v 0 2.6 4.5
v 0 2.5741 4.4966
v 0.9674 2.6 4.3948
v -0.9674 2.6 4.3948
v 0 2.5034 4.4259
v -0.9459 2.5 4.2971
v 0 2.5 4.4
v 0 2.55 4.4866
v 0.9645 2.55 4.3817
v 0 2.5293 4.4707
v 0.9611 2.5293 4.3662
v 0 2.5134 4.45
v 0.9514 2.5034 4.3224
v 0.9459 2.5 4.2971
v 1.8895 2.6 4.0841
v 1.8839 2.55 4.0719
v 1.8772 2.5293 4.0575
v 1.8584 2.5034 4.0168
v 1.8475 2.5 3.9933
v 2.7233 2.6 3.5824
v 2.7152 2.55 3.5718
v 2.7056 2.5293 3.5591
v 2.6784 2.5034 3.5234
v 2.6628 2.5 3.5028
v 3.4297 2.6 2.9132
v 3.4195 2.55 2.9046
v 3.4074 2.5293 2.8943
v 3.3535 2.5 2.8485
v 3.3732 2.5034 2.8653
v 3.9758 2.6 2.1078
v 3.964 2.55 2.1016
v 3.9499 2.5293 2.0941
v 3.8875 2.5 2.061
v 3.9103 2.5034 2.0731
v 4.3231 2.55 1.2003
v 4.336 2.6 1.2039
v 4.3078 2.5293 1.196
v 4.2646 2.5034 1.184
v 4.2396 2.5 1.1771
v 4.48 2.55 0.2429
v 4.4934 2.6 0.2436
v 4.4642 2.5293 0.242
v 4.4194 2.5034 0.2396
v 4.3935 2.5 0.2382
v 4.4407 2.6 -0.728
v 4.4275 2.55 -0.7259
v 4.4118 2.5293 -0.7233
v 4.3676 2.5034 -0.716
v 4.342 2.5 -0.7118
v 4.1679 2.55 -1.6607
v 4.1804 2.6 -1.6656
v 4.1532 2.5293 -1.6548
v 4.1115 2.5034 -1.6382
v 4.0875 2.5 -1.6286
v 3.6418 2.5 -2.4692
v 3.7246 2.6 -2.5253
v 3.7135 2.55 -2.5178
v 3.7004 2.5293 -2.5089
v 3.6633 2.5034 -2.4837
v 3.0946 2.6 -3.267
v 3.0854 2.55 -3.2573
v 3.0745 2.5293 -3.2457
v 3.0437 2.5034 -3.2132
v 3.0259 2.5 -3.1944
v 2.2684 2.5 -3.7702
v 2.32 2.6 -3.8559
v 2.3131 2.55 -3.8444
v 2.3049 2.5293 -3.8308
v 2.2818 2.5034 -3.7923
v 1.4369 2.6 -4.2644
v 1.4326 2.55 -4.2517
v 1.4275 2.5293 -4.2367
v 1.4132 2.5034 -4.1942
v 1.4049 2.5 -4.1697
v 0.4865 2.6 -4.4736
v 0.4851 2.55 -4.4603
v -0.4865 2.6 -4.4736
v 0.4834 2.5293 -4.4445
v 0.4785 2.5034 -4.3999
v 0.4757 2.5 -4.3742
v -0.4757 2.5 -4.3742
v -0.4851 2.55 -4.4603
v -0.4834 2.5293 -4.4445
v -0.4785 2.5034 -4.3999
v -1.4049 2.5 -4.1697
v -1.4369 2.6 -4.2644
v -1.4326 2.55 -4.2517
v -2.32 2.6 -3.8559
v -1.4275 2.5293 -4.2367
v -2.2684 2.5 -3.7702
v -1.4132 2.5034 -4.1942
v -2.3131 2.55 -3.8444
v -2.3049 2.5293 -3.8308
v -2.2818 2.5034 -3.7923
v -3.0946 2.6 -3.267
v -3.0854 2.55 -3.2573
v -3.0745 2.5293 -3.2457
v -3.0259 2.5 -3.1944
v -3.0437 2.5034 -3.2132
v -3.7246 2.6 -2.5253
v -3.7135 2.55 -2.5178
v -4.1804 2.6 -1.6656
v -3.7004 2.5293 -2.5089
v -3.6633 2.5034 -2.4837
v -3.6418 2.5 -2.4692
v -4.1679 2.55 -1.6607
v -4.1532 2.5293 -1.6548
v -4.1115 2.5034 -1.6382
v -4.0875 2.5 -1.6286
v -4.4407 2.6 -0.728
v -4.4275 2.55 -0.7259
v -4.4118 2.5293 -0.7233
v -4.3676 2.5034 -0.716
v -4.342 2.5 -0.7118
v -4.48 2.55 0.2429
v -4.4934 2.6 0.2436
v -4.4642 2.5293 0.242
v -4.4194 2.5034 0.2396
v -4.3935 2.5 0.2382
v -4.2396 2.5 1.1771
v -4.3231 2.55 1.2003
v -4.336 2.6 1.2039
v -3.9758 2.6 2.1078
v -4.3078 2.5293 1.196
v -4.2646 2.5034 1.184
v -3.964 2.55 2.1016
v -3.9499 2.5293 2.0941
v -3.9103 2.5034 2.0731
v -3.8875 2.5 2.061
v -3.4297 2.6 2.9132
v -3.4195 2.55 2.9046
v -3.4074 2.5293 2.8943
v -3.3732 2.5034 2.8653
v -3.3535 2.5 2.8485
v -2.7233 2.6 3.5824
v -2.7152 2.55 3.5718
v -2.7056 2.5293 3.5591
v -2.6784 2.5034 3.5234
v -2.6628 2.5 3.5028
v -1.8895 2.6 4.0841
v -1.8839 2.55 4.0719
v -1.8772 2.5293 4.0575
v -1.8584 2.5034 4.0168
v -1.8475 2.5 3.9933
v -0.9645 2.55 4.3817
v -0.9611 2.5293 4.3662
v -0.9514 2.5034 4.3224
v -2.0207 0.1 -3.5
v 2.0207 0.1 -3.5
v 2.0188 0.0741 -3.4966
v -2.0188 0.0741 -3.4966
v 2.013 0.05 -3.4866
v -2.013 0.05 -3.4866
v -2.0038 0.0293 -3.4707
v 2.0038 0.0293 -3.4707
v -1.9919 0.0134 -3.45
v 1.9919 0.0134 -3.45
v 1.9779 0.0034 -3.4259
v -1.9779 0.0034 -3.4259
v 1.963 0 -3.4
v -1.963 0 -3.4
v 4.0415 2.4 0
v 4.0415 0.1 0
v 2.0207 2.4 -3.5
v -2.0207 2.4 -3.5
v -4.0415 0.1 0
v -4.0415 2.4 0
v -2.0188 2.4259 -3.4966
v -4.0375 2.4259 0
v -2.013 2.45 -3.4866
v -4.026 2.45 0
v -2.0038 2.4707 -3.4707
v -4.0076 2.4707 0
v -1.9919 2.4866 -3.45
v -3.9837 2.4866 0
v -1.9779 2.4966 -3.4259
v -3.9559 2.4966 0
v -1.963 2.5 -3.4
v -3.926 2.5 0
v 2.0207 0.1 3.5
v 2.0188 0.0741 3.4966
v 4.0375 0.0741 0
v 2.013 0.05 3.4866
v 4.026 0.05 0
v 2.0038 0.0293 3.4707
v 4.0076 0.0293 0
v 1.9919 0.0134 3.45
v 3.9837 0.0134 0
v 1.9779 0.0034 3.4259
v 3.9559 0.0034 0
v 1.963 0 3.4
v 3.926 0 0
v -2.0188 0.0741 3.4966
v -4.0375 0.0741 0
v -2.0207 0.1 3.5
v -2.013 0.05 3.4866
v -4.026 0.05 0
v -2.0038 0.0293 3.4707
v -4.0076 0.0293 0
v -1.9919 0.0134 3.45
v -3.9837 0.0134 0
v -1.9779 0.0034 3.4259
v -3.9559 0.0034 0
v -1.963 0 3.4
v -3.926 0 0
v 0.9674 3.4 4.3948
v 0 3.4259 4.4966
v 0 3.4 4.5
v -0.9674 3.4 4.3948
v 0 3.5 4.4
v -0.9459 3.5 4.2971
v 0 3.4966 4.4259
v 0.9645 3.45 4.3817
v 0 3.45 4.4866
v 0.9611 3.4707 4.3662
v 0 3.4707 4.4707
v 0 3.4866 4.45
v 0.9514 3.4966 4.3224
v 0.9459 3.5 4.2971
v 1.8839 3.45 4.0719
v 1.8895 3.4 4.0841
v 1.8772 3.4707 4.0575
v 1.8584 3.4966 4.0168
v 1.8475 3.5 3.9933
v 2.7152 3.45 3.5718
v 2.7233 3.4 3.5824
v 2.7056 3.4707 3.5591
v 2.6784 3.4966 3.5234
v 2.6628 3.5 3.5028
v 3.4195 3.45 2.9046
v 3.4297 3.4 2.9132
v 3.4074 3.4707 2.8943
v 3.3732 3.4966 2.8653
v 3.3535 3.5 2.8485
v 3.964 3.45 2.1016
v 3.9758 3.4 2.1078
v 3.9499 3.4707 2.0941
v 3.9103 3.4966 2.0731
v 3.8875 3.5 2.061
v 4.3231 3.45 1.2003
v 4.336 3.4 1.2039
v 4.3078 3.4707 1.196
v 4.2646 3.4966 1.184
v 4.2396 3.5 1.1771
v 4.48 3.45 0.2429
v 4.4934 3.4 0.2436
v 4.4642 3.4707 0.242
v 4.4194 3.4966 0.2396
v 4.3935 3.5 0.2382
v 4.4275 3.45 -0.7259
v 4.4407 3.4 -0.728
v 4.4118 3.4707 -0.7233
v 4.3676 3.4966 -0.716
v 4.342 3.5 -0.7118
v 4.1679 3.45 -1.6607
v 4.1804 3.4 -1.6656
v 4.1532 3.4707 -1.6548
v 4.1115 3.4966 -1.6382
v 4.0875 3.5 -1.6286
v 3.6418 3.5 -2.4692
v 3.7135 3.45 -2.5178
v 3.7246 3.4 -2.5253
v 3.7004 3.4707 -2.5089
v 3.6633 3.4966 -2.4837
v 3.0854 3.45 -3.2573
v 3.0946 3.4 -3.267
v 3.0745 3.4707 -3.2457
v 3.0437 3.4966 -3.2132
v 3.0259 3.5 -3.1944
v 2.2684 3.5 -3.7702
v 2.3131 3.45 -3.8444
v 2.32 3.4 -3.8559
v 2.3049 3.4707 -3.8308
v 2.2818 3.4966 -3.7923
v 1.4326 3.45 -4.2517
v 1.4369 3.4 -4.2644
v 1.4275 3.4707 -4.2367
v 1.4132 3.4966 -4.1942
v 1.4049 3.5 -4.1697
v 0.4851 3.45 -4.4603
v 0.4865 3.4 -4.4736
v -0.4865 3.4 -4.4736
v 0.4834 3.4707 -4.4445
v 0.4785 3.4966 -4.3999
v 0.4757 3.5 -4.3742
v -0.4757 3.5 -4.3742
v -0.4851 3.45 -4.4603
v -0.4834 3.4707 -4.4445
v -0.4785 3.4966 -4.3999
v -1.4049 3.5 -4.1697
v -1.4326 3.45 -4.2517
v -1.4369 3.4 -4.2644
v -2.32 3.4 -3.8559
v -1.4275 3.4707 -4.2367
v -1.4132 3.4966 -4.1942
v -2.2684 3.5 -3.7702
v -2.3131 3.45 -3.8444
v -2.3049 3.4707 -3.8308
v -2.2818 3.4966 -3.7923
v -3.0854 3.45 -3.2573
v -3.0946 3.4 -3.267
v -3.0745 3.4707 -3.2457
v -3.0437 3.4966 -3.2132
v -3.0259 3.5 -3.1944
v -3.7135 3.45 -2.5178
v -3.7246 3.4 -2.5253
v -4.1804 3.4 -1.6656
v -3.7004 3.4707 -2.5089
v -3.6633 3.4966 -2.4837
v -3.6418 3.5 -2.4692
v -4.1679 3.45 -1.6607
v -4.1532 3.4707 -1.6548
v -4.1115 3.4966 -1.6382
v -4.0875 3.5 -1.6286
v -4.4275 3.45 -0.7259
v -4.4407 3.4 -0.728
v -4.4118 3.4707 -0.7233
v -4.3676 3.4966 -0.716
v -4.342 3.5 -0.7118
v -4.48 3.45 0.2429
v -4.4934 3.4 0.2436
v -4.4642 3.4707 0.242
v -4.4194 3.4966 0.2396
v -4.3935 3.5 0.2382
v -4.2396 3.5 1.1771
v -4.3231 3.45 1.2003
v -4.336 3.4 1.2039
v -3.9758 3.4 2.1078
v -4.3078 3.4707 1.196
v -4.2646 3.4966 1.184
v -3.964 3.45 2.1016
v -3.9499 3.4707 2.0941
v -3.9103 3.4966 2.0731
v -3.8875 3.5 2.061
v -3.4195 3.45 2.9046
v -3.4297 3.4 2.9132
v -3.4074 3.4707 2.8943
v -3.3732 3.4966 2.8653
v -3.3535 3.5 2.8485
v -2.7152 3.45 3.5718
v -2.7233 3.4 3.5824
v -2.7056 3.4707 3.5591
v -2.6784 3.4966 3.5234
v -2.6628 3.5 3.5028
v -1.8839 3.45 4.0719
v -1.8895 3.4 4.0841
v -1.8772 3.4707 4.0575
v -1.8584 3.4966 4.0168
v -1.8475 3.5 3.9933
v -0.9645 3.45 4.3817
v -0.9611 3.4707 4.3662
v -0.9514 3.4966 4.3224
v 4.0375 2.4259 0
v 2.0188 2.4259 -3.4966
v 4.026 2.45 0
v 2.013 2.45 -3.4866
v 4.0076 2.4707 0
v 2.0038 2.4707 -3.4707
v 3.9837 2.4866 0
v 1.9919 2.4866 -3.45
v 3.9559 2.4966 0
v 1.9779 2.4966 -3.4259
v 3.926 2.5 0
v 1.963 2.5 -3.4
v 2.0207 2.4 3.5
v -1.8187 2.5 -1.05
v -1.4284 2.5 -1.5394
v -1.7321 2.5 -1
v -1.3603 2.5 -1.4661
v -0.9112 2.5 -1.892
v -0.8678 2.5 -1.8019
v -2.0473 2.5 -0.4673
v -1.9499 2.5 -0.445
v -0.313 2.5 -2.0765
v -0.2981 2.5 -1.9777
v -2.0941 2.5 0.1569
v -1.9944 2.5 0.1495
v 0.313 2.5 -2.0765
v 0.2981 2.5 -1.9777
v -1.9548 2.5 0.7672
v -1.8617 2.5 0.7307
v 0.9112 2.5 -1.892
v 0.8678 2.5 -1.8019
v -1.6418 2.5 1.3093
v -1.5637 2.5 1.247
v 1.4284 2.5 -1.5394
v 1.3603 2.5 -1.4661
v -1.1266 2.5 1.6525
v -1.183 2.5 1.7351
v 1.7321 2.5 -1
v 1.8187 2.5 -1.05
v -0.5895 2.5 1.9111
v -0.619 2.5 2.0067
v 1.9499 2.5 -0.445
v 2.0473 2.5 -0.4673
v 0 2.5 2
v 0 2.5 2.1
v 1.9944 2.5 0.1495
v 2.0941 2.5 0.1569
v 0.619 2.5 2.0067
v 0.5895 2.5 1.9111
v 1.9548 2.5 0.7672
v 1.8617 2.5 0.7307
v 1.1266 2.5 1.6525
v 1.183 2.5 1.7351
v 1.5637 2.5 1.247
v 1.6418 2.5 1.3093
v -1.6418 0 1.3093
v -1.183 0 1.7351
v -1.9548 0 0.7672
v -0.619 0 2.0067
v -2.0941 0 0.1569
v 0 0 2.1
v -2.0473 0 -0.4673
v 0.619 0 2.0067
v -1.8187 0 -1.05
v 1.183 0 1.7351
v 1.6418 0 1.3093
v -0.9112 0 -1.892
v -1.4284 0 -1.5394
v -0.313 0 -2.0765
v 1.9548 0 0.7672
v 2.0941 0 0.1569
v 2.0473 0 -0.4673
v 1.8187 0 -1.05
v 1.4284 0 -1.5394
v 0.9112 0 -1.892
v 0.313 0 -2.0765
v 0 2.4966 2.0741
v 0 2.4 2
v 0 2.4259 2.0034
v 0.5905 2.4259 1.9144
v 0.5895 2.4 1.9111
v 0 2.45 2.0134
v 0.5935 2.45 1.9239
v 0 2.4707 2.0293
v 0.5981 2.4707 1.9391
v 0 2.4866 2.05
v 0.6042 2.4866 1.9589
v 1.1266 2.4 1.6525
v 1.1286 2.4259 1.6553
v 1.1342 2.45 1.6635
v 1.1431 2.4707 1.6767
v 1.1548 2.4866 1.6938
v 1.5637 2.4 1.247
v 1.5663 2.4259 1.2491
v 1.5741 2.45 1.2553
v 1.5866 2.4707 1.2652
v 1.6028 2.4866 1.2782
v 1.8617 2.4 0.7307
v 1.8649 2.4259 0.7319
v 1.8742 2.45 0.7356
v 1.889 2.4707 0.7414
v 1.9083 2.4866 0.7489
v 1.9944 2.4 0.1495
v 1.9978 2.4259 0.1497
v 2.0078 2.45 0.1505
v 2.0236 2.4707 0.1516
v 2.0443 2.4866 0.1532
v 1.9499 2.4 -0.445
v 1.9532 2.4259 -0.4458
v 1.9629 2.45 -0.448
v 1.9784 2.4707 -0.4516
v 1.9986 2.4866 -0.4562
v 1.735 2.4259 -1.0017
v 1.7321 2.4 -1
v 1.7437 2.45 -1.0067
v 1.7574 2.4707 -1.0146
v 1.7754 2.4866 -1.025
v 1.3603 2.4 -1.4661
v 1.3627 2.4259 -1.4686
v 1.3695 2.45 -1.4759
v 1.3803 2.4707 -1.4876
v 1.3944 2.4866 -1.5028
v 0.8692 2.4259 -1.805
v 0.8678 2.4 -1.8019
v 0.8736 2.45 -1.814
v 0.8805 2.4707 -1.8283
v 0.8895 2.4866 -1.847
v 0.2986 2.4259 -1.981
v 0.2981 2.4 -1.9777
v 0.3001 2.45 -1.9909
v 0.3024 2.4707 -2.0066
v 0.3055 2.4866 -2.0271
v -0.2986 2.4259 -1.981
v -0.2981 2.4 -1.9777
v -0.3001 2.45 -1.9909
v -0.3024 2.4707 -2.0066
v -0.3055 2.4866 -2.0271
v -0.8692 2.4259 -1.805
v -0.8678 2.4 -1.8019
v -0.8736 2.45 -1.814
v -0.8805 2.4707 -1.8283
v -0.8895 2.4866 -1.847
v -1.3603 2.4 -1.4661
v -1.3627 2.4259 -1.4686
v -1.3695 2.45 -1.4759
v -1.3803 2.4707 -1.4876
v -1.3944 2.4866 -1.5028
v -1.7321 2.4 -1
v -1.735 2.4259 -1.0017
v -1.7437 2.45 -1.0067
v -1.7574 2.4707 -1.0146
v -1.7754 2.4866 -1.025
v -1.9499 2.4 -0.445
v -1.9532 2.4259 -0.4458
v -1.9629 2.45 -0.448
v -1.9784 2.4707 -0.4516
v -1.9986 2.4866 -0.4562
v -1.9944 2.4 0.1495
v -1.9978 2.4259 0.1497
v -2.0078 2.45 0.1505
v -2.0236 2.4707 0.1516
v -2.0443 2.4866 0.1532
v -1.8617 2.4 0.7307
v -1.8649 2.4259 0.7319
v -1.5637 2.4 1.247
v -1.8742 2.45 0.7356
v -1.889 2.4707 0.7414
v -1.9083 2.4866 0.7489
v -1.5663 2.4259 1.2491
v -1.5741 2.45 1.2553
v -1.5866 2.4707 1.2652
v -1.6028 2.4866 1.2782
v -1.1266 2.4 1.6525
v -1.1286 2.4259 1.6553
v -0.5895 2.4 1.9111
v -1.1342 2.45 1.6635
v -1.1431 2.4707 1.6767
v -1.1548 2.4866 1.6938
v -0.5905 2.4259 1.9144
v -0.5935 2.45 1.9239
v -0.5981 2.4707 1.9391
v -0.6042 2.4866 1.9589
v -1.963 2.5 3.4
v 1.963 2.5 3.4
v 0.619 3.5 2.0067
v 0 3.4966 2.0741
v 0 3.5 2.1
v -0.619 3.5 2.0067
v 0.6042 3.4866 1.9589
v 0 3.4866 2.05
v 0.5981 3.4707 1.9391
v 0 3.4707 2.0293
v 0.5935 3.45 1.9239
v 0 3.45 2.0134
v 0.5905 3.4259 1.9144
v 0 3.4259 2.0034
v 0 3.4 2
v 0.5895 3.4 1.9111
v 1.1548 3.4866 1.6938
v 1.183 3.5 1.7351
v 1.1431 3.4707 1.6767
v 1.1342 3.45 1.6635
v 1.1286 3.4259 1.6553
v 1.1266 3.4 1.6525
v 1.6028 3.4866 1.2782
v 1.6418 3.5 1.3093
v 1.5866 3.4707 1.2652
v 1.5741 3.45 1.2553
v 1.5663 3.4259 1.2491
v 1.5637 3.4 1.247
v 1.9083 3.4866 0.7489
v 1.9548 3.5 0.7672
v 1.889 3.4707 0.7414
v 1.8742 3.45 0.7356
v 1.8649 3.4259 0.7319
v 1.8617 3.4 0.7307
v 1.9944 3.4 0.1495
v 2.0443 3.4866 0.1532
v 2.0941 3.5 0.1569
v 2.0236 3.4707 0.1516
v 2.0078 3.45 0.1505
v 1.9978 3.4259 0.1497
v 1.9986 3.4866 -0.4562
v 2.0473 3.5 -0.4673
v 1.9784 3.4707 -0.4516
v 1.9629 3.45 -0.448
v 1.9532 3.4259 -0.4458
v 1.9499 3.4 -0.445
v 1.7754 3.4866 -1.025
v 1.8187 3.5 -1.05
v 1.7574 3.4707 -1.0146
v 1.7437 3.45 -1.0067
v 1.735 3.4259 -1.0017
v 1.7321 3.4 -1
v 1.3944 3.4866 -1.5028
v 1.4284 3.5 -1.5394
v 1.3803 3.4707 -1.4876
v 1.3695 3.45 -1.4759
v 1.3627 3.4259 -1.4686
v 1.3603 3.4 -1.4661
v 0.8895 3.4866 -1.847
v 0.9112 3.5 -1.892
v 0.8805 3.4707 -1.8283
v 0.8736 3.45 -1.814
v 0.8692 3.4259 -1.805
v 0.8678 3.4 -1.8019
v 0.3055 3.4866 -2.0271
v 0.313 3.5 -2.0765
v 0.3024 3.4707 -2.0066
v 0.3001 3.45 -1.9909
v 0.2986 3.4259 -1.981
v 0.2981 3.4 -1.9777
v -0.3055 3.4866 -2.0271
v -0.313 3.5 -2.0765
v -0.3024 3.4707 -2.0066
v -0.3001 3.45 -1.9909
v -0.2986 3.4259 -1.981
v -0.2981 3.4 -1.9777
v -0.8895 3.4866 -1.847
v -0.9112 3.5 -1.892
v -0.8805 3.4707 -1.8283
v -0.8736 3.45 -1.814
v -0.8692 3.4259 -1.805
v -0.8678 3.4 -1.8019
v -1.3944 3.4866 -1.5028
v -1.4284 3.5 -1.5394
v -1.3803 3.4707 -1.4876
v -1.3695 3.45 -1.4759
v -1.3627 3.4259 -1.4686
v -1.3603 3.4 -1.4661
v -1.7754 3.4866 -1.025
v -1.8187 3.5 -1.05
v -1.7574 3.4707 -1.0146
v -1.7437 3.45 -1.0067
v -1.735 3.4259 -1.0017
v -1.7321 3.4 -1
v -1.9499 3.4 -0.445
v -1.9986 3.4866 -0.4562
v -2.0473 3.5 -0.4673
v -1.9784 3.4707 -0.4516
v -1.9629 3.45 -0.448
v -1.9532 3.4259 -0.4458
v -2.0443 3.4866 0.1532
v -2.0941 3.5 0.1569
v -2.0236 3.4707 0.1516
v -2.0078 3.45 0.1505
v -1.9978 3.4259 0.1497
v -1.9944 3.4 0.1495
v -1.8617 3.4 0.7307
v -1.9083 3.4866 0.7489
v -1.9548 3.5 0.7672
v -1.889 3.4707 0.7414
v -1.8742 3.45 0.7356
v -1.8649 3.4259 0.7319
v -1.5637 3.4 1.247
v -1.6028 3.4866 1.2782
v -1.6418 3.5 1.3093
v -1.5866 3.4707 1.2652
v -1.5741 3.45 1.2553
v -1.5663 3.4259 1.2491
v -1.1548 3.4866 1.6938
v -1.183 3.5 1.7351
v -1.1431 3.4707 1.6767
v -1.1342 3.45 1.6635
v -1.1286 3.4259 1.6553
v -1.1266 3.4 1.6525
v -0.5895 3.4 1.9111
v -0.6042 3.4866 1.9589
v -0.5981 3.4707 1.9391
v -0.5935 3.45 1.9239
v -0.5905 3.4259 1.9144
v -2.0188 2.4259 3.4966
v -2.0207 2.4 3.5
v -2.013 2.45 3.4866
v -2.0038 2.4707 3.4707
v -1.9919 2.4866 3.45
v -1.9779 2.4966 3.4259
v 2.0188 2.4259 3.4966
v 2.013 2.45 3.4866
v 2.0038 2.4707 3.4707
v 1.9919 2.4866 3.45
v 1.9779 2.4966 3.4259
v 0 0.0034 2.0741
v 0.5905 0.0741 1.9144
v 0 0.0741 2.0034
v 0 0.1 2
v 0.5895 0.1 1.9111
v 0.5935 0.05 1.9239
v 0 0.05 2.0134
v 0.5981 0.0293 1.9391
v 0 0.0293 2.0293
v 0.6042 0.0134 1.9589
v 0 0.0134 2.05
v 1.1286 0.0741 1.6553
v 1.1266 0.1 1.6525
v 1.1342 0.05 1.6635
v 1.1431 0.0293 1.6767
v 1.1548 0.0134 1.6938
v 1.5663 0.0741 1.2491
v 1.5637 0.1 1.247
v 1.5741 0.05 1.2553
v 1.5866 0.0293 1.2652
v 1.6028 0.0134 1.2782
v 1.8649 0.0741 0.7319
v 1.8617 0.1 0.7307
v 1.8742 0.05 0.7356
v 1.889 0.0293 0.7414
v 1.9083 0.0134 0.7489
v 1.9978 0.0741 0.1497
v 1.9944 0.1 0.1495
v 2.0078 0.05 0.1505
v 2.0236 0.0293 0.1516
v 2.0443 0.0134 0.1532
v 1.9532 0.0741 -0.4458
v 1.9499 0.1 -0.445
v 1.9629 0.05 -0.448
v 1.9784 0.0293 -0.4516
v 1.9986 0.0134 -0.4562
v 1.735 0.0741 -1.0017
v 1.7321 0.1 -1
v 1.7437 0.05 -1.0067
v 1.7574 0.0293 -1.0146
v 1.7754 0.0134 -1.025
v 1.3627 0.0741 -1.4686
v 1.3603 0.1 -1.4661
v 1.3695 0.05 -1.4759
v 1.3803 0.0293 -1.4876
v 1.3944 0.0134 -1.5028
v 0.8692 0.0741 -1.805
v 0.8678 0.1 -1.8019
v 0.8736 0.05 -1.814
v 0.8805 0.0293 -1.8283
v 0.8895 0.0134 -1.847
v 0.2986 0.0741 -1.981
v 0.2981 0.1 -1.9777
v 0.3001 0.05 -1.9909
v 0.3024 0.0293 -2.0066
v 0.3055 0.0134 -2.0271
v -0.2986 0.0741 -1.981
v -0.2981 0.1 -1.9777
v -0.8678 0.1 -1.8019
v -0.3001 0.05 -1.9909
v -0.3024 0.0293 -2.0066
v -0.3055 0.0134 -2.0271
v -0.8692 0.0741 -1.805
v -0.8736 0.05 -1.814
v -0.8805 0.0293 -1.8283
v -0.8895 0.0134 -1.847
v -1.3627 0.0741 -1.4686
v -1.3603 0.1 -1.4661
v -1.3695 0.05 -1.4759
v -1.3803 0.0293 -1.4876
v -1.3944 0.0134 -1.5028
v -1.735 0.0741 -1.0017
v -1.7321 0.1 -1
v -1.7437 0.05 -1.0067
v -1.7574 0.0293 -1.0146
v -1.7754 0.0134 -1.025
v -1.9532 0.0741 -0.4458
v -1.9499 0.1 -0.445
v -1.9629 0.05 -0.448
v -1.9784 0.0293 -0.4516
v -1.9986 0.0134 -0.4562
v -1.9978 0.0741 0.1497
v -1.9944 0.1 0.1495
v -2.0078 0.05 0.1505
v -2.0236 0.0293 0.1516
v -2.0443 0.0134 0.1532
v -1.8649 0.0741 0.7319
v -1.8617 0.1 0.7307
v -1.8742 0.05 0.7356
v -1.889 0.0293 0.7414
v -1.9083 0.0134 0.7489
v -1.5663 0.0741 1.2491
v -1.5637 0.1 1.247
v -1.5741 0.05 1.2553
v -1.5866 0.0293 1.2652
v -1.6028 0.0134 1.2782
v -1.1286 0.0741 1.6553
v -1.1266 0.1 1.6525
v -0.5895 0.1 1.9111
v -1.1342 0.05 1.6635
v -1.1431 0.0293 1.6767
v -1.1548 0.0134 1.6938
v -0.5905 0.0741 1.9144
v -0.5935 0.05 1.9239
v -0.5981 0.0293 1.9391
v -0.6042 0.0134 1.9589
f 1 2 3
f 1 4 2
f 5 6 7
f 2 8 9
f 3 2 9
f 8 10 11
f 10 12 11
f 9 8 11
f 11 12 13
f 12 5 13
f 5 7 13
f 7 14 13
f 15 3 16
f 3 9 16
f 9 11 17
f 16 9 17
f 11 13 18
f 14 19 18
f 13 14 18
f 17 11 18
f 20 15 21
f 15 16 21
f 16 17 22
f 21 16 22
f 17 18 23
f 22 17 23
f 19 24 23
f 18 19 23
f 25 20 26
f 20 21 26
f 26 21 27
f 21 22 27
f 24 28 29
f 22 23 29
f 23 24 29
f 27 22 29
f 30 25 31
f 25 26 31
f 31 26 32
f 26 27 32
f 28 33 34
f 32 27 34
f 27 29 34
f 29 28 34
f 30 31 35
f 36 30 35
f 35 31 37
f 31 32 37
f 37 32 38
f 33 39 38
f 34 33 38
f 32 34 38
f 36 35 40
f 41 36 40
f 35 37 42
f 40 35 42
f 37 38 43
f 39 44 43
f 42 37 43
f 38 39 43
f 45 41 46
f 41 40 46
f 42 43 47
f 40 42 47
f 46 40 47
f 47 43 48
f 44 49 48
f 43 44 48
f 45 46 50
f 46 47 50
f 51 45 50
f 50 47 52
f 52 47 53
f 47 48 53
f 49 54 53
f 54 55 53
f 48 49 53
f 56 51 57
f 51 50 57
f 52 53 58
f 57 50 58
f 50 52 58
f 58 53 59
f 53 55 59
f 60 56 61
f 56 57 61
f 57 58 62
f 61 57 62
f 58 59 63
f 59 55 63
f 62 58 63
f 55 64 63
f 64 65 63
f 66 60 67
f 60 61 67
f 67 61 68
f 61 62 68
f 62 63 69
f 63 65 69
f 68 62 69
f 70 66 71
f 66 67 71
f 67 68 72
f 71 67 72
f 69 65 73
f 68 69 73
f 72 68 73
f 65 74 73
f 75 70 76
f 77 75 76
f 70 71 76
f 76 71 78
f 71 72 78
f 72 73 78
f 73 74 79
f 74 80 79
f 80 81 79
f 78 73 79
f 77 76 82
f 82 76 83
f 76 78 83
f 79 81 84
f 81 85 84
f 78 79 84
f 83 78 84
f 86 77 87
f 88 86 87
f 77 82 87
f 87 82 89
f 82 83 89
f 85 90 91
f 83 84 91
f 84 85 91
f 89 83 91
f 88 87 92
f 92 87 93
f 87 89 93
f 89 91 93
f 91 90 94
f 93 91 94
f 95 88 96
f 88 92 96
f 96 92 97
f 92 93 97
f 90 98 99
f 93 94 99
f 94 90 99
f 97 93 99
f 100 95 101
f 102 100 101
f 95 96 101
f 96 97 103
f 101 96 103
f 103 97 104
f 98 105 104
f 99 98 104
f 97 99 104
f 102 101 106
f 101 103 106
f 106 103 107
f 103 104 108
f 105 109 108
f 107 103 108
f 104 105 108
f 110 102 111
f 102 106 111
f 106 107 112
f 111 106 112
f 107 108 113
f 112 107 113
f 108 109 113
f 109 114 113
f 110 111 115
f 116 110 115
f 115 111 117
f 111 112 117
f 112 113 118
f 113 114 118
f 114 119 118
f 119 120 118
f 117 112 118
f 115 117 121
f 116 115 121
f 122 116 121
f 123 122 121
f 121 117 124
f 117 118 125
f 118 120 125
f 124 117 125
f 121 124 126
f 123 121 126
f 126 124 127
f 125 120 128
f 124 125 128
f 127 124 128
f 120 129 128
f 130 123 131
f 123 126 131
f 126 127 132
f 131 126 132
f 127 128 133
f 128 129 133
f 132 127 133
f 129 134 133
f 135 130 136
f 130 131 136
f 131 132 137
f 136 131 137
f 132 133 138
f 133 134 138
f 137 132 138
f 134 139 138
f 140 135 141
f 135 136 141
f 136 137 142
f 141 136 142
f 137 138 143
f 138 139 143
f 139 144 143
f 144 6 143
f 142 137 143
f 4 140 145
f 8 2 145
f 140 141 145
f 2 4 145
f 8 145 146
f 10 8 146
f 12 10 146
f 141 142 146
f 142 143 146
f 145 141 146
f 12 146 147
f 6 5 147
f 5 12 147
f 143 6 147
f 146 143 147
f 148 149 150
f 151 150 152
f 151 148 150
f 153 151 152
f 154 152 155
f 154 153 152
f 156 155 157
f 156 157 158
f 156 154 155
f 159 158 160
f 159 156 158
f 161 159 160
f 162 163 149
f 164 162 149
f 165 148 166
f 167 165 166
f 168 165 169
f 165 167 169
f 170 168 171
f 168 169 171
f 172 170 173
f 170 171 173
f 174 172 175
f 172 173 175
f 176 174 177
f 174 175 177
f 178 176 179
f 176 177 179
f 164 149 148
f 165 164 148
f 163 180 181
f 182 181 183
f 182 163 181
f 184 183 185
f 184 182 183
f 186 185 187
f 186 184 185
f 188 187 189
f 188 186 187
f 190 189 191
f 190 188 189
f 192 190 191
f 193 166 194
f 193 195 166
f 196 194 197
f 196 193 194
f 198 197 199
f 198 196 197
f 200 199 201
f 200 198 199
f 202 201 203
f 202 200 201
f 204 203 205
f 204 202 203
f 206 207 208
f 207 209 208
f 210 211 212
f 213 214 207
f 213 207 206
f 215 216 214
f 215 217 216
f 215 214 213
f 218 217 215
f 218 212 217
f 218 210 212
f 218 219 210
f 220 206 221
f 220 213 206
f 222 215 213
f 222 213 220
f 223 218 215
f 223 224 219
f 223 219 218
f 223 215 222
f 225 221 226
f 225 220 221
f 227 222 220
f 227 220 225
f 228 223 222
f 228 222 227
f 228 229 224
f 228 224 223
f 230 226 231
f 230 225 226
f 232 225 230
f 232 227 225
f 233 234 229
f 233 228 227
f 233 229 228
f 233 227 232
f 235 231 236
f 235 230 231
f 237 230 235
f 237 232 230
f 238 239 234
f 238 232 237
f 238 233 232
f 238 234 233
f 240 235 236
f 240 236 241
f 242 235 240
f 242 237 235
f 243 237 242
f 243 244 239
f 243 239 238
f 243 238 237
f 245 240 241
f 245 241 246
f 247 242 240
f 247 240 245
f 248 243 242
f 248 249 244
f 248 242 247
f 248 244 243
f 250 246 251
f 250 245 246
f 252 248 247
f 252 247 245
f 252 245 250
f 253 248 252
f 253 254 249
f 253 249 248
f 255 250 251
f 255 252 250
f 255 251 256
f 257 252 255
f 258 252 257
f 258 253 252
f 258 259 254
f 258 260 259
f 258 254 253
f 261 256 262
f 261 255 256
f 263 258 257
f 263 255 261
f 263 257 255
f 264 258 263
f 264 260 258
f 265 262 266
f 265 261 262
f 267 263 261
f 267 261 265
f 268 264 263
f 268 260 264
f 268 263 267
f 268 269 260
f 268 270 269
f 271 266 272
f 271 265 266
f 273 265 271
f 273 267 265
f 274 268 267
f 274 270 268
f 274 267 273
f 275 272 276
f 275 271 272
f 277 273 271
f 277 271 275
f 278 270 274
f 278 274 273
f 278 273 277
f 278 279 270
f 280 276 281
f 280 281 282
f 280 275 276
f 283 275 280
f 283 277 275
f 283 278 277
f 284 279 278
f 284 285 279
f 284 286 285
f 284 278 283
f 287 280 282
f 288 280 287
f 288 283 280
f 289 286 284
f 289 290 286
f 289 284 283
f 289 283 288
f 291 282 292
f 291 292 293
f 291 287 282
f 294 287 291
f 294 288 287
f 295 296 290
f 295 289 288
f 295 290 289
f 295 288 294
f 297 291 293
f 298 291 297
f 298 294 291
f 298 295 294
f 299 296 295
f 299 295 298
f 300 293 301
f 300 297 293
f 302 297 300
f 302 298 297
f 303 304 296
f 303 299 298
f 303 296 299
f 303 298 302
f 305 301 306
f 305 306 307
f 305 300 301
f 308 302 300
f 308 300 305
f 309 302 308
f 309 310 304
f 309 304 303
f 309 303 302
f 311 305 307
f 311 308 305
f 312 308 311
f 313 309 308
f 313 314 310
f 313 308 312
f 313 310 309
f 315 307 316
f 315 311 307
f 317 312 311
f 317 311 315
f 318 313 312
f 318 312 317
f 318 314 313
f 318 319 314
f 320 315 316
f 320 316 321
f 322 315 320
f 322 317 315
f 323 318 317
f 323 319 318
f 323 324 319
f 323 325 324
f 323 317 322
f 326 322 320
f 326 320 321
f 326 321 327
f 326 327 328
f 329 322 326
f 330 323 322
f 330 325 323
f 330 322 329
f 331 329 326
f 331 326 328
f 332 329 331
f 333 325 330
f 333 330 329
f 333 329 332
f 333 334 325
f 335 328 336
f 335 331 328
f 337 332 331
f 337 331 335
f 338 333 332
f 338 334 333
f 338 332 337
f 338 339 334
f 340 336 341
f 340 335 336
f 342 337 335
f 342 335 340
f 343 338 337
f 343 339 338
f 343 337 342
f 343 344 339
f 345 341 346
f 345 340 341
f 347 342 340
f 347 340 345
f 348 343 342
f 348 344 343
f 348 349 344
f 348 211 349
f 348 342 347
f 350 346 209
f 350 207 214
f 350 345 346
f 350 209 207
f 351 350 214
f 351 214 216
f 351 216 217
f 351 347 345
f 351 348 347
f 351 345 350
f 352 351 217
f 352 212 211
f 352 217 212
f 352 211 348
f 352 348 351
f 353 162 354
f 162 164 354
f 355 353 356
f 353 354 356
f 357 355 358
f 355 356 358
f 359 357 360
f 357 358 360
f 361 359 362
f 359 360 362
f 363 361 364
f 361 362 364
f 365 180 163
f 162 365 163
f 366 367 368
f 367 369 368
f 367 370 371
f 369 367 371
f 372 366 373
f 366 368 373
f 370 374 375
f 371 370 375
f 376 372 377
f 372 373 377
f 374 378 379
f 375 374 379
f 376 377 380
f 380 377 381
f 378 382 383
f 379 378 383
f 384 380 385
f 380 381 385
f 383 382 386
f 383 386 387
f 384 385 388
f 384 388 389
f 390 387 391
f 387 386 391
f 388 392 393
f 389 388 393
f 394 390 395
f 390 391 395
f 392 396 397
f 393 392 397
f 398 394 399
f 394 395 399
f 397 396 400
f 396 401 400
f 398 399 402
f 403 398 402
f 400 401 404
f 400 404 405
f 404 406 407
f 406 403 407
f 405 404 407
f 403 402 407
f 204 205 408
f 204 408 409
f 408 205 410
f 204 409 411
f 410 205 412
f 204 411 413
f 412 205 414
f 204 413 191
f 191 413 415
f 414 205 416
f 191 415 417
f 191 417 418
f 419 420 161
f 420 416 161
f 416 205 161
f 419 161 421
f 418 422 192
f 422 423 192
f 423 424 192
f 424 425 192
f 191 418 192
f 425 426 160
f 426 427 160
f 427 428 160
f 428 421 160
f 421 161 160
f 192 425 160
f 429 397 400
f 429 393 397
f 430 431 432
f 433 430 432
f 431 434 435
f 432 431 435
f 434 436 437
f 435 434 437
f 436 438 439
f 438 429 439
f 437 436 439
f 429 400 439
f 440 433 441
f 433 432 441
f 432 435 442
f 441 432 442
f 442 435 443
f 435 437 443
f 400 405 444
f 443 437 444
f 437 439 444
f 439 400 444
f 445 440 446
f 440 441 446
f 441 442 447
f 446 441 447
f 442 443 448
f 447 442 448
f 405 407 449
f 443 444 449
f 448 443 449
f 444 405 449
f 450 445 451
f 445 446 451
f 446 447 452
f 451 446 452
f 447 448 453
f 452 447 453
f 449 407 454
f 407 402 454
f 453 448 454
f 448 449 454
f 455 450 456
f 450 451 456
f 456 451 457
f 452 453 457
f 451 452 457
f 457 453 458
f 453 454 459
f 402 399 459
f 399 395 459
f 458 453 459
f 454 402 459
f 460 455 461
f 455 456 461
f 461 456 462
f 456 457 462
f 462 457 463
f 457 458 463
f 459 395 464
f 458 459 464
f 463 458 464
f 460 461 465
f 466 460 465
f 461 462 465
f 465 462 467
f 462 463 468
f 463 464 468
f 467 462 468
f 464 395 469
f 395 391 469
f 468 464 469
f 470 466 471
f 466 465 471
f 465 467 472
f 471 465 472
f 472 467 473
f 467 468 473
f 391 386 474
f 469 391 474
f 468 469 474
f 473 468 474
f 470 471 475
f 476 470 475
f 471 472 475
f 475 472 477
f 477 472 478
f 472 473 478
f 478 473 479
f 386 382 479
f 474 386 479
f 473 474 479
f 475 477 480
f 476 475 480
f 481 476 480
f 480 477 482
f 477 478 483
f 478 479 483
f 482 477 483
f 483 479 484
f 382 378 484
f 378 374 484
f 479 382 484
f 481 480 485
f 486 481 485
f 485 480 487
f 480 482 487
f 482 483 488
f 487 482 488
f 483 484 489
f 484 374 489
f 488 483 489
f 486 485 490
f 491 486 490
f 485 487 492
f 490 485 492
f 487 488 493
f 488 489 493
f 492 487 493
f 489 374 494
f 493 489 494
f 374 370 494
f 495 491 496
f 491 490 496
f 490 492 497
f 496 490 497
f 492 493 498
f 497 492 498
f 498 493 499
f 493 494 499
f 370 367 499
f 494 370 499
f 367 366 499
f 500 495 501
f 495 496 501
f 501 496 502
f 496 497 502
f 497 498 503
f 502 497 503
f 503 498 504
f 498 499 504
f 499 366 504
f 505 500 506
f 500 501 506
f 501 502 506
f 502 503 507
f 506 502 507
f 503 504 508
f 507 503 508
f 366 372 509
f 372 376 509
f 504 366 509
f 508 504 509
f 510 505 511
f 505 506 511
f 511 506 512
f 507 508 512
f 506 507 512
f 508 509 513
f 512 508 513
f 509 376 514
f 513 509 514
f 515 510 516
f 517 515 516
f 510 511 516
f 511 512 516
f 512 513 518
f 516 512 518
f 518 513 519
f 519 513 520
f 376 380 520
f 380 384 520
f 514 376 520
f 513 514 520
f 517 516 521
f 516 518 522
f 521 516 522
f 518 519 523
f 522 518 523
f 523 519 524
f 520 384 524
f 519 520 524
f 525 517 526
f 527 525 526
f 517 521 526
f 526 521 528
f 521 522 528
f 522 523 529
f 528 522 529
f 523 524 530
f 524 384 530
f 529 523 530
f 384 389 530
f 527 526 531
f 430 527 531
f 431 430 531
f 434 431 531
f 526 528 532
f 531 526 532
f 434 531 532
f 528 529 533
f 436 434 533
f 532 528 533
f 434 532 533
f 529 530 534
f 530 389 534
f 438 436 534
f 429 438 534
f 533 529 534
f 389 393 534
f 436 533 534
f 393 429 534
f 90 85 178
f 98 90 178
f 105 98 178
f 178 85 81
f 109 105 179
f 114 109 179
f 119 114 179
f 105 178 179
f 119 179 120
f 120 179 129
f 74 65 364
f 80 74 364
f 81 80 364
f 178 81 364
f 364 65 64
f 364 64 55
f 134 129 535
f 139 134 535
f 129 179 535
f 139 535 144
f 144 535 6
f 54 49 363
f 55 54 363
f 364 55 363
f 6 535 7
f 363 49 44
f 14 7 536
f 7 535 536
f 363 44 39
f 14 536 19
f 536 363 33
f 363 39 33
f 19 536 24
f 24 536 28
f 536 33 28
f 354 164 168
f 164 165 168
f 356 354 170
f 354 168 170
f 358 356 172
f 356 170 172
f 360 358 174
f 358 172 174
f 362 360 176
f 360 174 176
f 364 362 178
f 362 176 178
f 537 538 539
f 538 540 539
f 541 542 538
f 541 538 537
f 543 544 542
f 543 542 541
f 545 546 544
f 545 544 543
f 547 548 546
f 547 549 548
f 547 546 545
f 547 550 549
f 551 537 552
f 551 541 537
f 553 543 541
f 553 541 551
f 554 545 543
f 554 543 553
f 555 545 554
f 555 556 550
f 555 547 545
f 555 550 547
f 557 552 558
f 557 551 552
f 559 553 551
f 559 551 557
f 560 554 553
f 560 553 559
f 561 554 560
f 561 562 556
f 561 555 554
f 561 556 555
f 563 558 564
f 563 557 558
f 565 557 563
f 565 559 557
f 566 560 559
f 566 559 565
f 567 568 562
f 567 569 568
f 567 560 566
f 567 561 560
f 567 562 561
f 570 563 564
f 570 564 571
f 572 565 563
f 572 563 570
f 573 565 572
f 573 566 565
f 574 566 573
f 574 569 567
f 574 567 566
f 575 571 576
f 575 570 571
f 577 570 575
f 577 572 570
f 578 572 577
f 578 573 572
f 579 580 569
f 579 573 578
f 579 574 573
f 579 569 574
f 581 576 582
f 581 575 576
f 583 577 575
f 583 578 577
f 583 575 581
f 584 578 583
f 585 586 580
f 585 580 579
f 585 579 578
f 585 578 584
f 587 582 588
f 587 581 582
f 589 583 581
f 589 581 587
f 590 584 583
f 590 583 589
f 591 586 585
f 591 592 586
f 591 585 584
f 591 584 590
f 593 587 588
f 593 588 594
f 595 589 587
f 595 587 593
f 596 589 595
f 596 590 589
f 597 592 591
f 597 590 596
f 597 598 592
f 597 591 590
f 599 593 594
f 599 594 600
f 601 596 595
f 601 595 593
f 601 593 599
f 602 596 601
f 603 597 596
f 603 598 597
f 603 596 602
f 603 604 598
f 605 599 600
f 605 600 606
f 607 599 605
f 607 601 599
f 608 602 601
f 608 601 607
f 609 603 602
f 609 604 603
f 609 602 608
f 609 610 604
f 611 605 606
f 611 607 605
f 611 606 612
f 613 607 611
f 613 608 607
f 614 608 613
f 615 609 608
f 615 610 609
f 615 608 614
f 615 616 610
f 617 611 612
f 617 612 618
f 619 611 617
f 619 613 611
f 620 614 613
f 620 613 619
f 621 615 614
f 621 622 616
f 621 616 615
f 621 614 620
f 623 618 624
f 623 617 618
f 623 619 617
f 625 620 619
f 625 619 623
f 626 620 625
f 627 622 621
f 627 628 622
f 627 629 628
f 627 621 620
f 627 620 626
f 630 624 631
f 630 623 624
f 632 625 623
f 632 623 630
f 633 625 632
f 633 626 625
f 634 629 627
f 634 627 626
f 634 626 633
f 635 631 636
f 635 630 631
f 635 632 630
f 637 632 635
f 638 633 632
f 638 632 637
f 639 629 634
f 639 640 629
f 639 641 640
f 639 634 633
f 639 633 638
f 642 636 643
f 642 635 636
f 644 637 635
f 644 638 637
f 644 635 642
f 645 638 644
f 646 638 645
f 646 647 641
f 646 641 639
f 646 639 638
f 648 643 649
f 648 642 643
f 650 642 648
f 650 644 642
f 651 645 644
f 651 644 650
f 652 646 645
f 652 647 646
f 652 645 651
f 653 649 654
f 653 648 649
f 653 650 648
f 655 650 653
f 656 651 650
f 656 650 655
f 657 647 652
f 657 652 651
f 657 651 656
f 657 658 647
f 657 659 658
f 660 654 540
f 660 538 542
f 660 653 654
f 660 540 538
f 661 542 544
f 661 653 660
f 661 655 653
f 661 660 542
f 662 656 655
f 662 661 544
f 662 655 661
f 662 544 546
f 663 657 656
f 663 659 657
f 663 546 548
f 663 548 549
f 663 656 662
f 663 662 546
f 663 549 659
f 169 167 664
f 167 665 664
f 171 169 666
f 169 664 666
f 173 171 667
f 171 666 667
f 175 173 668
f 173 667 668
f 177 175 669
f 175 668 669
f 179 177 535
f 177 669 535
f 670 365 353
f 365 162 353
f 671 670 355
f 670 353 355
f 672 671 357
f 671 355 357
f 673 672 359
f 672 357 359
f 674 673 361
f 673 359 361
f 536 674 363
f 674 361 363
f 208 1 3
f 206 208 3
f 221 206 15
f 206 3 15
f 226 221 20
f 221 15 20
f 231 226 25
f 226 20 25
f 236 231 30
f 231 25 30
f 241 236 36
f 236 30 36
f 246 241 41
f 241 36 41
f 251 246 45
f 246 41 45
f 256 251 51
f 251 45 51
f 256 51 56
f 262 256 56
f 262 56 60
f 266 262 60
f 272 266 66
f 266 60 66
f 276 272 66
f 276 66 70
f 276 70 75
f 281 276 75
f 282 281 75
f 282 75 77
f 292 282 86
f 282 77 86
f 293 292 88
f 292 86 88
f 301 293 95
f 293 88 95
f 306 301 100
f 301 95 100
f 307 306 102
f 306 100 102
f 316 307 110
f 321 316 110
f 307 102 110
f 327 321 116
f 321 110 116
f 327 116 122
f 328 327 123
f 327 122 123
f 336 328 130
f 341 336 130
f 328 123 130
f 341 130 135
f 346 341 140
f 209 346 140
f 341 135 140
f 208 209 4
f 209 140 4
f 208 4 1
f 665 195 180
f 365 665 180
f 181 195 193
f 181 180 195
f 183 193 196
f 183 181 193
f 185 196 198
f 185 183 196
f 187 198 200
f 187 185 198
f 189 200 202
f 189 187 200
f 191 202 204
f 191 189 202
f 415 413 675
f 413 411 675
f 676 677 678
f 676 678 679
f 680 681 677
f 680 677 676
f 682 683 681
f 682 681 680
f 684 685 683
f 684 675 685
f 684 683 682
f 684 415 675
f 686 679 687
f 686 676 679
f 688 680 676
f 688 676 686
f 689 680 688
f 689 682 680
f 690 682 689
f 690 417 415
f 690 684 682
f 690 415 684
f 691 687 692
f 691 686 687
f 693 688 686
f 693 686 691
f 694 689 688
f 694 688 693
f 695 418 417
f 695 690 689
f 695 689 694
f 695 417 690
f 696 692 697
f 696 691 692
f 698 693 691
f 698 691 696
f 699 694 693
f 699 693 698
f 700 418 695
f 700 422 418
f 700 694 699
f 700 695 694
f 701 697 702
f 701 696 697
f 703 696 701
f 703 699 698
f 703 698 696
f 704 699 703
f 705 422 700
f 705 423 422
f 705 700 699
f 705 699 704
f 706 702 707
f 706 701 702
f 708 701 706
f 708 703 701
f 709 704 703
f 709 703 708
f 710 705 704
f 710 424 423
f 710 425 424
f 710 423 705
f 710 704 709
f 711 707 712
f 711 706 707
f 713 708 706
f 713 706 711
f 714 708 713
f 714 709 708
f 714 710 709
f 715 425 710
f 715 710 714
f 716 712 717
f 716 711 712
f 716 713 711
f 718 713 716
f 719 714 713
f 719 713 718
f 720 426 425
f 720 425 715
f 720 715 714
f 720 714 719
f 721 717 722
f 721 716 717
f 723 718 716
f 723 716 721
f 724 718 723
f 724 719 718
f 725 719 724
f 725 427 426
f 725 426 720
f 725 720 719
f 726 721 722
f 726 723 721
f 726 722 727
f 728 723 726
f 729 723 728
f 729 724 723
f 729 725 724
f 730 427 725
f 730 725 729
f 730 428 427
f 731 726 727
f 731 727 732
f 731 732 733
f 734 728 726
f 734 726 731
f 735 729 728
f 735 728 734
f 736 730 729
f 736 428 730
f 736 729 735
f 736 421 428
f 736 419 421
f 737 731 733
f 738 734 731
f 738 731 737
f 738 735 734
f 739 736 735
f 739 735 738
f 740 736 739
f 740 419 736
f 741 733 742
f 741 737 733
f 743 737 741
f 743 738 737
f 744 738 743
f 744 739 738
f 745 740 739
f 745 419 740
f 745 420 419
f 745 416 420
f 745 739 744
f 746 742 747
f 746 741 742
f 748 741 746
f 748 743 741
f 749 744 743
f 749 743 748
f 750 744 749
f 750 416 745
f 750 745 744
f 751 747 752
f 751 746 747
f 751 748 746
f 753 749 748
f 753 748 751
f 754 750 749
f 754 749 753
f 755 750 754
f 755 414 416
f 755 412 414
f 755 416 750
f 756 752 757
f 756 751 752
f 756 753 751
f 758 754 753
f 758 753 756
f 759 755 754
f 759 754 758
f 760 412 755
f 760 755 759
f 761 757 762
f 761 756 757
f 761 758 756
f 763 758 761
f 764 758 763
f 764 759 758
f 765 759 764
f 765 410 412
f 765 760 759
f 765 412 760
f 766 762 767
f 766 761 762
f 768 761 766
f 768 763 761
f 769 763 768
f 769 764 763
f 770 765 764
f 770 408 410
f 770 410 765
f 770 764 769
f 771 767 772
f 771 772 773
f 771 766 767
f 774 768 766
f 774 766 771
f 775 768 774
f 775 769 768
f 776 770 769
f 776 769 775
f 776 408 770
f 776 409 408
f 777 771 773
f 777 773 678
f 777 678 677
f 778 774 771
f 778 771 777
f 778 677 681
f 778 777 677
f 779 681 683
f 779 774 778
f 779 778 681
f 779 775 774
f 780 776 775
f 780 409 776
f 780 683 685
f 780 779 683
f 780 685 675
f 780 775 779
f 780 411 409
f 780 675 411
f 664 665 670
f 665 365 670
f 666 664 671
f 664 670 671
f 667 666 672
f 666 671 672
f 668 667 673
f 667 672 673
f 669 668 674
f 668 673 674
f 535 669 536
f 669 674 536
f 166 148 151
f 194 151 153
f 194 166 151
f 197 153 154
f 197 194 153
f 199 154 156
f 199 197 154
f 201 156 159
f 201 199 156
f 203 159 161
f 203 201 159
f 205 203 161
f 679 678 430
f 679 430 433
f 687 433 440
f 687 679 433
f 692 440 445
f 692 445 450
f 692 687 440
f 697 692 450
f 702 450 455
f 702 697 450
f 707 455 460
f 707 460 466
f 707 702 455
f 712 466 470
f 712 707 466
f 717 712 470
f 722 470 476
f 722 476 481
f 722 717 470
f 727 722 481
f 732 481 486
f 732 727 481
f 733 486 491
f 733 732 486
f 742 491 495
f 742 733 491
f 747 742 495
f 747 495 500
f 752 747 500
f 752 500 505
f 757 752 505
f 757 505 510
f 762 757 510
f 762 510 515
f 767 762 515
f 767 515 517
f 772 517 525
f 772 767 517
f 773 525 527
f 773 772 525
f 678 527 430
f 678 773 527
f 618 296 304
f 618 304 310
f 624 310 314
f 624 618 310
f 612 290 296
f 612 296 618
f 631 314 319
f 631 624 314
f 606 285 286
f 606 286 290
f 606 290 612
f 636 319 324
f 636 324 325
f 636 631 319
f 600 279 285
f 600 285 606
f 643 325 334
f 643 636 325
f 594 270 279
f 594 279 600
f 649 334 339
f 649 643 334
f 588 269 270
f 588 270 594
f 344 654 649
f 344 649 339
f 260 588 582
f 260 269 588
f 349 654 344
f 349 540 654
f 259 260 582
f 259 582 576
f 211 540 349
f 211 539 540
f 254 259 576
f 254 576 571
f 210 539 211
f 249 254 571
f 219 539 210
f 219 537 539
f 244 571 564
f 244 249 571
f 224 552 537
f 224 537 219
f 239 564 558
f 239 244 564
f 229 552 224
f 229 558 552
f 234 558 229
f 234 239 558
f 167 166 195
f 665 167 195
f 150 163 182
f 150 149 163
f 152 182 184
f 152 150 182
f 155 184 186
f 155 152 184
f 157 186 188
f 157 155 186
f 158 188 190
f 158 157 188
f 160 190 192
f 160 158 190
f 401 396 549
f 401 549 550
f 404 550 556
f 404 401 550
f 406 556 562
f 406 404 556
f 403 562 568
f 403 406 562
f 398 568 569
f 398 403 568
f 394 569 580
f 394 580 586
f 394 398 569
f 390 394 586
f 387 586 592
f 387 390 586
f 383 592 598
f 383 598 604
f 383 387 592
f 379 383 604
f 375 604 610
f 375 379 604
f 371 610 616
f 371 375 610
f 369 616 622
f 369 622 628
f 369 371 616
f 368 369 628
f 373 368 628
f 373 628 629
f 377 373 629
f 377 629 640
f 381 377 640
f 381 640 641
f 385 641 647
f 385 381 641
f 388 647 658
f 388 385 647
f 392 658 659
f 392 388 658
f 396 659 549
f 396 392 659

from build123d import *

# Parameters (mm, degrees)
SKETCH1_R           = 2
BOSS_EXTRUDE1_DEPTH = 2.5
FILLET1_R           = 0.1
SKETCH2_R           = 4.5
SKETCH2_R_2         = 2
BOSS_EXTRUDE2_DEPTH = 1
FILLET2_R           = 0.1


with BuildPart() as part:
    # Sketch1 → Boss-Extrude1 (new body)
    with BuildSketch(Plane(origin=(0, 0, 0), x_dir=(1, 0, 0), z_dir=(0, 1, 0))):
        Polygon((2.020725942, -3.5), (4.041451884, 0), (2.020725942, 3.5), (-2.020725942, 3.5), (-4.041451884, 0), (-2.020725942, -3.5), align=None)
        with Locations(Location((0, 0, 0), (0, 0, 270))):
            Circle(SKETCH1_R, mode=Mode.SUBTRACT)
    extrude(amount=BOSS_EXTRUDE1_DEPTH)

    # Fillet1
    fillet1_edges = [part.edges().sort_by_distance(p)[0] for p in [
        (3.031088913, 2.5, -1.75),
        (0, 2.5, -3.5),
        (-3.031088913, 2.5, -1.75),
        (0, 0, -2),
        (0, 2.5, -2),
        (-3.031088913, 2.5, 1.75),
        (0, 2.5, 3.5),
        (-3.031088913, 0, 1.75),
        (-3.031088913, 0, -1.75),
        (0, 0, -3.5),
        (3.031088913, 2.5, 1.75),
        (3.031088913, 0, -1.75),
        (3.031088913, 0, 1.75),
        (0, 0, 3.5),
    ]]
    fillet(fillet1_edges, radius=FILLET1_R)

    # Sketch2 → Boss-Extrude2 (add)
    with BuildSketch(Plane(origin=(0, 2.5, 0), x_dir=(1, 0, 0), z_dir=(0, 1, 0))):
        with Locations(Location((0, 0, 0), (0, 0, 270))):
            Circle(SKETCH2_R)
        with Locations(Location((0, 0, 0), (0, 0, 270))):
            Circle(SKETCH2_R_2, mode=Mode.SUBTRACT)
    extrude(amount=BOSS_EXTRUDE2_DEPTH)

    # Fillet2
    fillet2_edges = [part.edges().sort_by_distance(p)[0] for p in [
        (0, 3.5, -4.5),
        (0, 2.5, -4.5),
        (0, 3.5, -2),
    ]]
    fillet(fillet2_edges, radius=FILLET2_R)


solid = part.part
